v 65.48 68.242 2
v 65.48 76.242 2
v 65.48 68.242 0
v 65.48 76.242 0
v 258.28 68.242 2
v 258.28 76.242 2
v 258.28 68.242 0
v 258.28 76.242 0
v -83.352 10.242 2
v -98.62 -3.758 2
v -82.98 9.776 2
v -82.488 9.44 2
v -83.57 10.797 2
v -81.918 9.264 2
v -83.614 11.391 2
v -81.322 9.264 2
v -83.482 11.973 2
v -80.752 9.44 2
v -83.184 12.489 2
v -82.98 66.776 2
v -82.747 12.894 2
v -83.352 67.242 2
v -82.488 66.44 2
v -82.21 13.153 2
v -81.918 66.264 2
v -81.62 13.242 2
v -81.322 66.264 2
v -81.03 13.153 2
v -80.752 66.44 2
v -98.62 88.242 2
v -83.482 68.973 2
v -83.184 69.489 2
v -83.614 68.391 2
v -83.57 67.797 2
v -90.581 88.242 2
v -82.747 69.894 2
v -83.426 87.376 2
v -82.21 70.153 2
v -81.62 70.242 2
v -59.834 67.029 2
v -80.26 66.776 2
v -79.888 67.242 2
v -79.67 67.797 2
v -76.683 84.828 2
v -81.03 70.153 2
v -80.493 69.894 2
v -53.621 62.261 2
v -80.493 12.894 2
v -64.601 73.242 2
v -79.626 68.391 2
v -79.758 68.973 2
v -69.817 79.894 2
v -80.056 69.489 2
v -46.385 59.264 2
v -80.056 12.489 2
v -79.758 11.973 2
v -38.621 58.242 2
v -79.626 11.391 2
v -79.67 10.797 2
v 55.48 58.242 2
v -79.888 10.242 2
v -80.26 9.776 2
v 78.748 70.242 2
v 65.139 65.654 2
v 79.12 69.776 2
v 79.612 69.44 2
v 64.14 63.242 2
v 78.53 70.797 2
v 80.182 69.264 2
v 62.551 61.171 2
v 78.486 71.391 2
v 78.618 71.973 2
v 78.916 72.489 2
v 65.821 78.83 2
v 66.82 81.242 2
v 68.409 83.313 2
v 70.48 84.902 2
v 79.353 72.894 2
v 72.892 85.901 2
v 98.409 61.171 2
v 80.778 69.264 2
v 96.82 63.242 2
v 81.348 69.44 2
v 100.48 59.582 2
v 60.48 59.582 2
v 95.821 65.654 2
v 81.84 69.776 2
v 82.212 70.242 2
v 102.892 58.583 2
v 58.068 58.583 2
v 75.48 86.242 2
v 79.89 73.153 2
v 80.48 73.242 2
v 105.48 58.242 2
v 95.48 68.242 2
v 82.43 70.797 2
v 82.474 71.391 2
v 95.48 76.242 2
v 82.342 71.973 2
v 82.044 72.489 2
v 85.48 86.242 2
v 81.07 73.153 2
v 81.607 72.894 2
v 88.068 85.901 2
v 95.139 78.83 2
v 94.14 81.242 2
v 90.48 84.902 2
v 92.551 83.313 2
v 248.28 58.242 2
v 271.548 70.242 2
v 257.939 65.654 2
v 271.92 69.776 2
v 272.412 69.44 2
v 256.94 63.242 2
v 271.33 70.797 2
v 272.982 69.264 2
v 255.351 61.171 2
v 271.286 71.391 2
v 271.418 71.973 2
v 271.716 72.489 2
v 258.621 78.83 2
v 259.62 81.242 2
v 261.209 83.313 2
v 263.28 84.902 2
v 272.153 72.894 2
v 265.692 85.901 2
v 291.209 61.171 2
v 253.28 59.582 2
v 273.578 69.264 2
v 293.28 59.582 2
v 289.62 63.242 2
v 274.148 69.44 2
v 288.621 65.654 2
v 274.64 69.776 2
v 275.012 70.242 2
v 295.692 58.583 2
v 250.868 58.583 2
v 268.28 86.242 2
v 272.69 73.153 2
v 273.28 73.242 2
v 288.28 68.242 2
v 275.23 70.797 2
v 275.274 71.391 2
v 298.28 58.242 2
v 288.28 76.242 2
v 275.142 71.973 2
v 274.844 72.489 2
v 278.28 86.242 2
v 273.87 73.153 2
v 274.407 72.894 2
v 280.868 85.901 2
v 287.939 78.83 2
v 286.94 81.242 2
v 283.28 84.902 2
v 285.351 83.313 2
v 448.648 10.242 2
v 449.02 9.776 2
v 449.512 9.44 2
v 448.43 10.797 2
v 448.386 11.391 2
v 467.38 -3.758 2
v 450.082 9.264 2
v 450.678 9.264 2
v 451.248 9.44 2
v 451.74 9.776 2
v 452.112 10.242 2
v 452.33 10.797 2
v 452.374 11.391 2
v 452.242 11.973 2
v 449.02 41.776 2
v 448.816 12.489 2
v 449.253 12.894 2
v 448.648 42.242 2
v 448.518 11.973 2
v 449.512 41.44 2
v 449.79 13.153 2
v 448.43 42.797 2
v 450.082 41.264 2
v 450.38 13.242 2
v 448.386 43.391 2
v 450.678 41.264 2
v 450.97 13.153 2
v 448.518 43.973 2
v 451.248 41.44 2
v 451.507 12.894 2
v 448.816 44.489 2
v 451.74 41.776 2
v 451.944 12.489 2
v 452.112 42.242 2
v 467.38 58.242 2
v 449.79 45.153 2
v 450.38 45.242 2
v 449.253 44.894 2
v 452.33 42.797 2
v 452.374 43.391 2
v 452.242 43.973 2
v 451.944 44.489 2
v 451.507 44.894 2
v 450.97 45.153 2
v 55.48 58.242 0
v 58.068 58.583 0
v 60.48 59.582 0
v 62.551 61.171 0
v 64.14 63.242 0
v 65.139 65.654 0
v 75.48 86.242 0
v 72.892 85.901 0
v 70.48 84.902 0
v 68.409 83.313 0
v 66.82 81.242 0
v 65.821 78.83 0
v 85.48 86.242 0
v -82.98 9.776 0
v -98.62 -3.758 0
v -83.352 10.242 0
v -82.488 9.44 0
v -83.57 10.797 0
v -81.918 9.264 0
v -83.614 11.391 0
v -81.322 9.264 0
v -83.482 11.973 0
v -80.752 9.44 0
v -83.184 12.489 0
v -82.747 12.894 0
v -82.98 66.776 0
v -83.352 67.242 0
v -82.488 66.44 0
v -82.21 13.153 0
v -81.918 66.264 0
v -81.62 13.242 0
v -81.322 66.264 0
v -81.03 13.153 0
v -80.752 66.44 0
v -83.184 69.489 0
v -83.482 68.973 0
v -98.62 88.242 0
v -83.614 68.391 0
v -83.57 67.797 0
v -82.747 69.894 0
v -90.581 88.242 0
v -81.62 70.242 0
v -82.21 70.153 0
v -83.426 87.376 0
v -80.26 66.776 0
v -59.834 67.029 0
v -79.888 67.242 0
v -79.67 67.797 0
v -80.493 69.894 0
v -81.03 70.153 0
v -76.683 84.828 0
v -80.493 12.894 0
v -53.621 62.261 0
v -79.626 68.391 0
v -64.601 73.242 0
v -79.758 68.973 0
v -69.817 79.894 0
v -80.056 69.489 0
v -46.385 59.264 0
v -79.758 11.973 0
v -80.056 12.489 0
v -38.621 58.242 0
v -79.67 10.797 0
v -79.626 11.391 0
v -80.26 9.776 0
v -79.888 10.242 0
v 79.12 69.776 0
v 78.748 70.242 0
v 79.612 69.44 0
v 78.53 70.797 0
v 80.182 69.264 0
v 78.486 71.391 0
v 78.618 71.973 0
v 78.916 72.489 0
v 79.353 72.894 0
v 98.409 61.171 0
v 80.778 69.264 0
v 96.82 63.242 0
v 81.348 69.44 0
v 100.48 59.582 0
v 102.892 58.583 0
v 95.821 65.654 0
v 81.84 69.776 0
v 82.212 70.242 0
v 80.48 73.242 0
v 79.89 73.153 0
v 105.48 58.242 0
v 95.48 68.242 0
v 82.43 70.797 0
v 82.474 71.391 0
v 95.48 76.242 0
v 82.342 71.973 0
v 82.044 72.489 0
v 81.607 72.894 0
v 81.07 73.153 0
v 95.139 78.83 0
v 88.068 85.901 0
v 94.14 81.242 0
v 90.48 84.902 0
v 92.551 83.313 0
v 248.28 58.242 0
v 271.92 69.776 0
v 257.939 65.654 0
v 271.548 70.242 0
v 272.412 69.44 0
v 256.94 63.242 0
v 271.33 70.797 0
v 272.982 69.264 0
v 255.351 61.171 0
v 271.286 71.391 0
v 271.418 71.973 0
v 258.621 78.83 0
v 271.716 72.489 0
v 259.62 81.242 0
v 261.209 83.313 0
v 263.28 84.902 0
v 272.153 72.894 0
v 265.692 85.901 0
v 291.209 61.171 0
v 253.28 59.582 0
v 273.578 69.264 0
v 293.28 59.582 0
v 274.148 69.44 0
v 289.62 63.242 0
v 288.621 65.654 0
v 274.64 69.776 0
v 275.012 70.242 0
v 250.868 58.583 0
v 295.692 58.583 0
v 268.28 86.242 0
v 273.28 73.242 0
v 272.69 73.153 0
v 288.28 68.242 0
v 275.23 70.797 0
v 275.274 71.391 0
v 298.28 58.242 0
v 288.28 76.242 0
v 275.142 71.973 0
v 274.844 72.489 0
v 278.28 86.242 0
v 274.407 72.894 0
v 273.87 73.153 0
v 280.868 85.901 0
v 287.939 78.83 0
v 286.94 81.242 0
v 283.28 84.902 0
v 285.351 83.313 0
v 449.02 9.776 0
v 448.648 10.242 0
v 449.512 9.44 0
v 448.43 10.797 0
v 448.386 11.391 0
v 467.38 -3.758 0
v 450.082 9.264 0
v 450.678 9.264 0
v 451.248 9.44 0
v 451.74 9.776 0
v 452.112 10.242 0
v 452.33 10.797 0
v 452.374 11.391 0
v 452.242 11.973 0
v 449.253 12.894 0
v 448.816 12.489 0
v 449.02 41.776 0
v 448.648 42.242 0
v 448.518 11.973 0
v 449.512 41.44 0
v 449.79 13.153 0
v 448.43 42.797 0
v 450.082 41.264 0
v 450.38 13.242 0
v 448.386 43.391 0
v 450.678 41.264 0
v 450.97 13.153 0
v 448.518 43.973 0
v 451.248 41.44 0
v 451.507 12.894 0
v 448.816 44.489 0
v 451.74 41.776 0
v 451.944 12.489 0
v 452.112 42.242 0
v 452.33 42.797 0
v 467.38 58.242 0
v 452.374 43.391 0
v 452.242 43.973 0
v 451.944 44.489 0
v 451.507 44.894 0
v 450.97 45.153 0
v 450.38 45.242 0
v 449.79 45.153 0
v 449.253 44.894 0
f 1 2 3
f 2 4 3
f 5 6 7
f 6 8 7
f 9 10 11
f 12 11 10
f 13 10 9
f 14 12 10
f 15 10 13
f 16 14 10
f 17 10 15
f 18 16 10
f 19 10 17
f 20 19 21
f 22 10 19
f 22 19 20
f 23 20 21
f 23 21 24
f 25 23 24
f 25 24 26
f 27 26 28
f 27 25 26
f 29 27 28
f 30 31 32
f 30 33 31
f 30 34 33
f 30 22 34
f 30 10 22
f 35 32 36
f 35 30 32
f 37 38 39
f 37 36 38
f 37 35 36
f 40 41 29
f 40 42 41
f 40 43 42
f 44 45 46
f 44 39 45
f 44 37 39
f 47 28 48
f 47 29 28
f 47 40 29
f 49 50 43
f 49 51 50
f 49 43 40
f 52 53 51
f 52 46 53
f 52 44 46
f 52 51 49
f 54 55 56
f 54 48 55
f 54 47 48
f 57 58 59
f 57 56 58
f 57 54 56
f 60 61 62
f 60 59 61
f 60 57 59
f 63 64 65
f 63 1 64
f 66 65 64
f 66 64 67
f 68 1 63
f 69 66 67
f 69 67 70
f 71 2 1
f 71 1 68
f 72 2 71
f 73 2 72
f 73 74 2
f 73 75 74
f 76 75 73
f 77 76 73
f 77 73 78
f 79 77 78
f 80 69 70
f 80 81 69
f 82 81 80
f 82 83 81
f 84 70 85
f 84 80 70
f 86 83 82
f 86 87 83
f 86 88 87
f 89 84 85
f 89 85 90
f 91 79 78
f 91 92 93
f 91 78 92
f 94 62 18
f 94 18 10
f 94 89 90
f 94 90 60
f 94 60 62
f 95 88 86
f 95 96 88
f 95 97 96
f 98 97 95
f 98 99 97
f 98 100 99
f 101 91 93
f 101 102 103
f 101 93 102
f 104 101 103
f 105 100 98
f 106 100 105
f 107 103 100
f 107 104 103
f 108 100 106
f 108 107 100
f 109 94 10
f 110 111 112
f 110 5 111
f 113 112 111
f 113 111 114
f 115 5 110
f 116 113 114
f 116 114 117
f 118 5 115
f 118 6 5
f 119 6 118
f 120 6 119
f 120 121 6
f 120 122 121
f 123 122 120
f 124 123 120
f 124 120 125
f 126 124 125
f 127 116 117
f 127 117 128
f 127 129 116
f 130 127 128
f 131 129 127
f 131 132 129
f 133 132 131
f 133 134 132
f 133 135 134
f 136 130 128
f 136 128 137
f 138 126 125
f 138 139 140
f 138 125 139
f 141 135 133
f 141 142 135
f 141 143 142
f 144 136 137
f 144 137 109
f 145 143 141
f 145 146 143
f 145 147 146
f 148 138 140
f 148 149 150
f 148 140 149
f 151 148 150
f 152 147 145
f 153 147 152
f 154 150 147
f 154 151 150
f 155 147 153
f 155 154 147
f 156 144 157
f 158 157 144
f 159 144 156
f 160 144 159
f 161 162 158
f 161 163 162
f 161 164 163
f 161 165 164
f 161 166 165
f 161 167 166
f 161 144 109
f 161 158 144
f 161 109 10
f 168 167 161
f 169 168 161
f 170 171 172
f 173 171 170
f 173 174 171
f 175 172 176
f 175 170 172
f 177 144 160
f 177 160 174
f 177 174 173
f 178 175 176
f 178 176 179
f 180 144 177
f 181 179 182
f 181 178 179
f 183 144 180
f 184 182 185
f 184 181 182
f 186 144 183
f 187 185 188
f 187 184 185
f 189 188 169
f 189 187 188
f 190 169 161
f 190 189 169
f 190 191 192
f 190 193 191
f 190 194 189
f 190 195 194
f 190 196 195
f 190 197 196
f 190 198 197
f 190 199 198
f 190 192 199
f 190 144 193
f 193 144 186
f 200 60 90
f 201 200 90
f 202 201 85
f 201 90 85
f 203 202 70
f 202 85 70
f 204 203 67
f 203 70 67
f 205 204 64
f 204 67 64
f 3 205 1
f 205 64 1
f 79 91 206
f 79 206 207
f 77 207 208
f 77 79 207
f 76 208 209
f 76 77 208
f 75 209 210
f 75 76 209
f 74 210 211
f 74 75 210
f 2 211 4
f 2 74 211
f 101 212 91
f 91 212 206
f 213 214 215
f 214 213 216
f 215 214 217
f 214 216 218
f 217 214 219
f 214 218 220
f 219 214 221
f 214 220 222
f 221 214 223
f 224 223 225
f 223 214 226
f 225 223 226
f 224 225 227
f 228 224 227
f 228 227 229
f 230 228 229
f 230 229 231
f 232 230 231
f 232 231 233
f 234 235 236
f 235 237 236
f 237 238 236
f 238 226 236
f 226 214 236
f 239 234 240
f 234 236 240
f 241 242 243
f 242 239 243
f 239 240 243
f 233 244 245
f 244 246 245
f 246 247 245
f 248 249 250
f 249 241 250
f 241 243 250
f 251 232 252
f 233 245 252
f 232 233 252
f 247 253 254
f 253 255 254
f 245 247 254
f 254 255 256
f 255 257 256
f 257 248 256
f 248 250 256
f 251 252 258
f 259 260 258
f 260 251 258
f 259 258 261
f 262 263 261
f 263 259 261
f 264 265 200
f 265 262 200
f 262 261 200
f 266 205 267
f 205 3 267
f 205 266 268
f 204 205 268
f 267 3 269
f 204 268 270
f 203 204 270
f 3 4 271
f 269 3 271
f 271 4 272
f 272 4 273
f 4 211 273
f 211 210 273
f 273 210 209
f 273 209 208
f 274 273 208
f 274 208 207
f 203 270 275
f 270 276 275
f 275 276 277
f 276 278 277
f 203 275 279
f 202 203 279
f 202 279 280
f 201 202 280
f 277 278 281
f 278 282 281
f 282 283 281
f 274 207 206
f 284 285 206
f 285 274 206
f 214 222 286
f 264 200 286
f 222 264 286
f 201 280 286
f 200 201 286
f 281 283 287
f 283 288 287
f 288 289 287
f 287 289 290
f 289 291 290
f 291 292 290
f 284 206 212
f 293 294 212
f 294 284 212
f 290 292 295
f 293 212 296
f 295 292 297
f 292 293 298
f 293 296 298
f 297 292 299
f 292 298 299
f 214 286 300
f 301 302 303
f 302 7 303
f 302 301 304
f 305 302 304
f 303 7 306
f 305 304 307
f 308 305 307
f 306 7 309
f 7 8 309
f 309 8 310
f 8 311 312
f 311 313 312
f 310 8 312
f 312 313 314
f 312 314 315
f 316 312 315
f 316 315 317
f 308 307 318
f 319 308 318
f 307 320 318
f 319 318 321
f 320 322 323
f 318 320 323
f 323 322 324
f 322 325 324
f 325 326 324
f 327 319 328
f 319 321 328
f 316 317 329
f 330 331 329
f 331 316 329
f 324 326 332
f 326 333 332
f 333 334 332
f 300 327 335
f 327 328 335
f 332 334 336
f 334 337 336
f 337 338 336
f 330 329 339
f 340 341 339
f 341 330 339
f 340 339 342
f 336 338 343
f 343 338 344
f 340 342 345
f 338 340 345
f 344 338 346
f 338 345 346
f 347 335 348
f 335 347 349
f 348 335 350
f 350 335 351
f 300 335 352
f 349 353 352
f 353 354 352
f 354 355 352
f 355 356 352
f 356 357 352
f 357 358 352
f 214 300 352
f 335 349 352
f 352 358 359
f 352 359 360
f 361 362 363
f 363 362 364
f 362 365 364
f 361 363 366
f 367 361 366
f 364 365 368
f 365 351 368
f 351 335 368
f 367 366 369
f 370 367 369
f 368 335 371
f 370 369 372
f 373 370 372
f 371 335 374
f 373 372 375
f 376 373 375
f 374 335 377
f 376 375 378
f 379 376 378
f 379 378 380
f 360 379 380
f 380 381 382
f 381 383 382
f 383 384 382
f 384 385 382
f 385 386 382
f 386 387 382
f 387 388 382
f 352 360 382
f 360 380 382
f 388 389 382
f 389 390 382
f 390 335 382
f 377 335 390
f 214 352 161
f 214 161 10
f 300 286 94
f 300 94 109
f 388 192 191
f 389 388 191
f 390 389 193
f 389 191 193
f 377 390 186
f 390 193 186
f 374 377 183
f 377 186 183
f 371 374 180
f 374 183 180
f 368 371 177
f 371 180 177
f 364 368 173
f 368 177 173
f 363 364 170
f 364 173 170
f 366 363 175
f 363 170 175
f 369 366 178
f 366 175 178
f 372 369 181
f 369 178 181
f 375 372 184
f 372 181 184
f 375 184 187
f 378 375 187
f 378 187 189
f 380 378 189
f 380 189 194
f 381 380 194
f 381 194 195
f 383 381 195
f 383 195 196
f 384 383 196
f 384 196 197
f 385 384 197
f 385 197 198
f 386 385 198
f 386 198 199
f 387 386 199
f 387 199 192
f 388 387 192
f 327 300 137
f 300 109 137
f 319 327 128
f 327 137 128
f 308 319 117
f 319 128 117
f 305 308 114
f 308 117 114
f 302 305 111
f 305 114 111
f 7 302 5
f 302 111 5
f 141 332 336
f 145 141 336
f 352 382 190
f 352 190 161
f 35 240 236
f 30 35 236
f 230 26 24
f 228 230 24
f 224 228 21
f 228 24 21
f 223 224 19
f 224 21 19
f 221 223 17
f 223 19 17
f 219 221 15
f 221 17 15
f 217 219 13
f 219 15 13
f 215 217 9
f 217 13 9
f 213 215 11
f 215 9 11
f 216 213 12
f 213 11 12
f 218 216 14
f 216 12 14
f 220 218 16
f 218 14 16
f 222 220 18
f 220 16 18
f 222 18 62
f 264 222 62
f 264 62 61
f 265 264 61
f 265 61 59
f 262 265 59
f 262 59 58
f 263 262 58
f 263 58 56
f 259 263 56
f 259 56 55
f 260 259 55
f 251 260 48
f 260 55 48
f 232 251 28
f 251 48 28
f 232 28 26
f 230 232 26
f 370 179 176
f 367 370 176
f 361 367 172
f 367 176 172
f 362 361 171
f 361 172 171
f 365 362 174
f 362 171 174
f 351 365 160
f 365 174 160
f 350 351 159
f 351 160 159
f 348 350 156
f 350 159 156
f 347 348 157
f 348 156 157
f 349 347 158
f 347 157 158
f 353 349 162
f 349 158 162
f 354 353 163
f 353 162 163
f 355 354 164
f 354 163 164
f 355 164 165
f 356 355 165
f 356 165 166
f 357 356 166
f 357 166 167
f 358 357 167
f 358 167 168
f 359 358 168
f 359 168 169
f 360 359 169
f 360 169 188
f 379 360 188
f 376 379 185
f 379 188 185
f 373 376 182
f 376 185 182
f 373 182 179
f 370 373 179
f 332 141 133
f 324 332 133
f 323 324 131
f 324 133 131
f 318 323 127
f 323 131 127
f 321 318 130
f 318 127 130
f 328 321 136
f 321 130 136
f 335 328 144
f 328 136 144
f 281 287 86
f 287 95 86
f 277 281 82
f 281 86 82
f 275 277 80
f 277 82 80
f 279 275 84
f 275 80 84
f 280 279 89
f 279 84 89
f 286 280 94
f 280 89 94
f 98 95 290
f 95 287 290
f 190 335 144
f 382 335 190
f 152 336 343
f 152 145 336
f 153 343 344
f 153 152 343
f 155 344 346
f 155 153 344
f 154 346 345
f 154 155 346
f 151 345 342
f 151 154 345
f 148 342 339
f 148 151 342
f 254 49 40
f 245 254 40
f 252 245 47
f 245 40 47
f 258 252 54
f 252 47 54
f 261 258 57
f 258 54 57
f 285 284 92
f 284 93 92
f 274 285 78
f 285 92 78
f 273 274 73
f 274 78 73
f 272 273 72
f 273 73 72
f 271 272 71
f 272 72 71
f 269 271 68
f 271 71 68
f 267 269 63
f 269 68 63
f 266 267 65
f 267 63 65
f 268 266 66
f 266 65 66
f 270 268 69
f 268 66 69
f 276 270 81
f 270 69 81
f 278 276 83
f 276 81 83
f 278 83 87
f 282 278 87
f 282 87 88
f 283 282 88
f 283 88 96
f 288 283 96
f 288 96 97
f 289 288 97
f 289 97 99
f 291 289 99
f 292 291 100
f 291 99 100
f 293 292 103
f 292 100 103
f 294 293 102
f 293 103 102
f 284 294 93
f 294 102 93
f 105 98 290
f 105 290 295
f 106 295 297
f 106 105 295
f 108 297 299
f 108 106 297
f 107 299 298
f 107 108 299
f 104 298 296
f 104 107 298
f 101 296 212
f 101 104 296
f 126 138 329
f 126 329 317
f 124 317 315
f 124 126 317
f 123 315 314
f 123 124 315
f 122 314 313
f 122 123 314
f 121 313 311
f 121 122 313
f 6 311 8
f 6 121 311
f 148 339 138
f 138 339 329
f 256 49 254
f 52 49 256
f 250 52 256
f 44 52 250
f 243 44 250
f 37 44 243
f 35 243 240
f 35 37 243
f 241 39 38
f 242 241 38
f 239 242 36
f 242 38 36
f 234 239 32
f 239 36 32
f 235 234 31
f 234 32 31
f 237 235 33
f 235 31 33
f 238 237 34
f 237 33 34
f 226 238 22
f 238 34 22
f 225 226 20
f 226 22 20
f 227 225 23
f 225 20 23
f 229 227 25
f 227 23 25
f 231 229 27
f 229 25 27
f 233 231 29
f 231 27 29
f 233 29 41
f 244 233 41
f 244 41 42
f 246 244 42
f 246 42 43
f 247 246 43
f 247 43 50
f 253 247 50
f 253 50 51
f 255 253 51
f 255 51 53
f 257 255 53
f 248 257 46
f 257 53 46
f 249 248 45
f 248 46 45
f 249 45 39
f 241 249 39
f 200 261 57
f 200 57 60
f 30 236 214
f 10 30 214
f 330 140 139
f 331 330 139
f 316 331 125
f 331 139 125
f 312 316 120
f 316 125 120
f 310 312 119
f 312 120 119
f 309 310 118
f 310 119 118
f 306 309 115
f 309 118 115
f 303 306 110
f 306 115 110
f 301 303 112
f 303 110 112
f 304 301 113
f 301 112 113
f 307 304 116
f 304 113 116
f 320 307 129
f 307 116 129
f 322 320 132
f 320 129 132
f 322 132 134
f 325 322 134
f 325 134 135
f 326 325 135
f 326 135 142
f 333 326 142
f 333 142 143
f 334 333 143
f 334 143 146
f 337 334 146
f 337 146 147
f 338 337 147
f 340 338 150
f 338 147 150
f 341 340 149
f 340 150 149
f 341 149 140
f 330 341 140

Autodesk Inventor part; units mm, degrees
ref_plane "YZ Plane" through (0, 0, 0) normal (1, 0, 0) x (0, 1, 0)
ref_plane "XZ Plane" through (0, 0, 0) normal (0, 1, 0) x (-1, 0, 0)
ref_plane "XY Plane" through (0, 0, 0) normal (0, 0, 1) x (1, 0, 0)
sketch "Szkic1" plane through (0, 0, 0) normal (0, 0, 1) x (1, 0, 0)
  line L0 (-98.62, 58.242) -> (467.38, 58.242)
  line L1 (467.38, 58.242) -> (467.38, -3.758)
  line L2 (467.38, -3.758) -> (-98.62, -3.758)
  line L3 (-98.62, -3.758) -> (-98.62, 58.242)
  line L4 (65.48, 58.242) -> (95.48, 58.242)
  line L5 (95.48, 58.242) -> (95.48, 86.242)
  line L6 (95.48, 86.242) -> (65.48, 86.242)
  line L7 (65.48, 86.242) -> (65.48, 58.242)
  line L8 (258.28, 58.242) -> (288.28, 58.242)
  line L9 (288.28, 58.242) -> (288.28, 86.242)
  line L10 (288.28, 86.242) -> (258.28, 86.242)
  line L11 (258.28, 86.242) -> (258.28, 58.242)
  line L12 (-98.62, 58.242) -> (-68.62, 58.242)
  line L13 (-68.62, 58.242) -> (-68.62, 88.242)
  line L14 (-68.62, 88.242) -> (-98.62, 88.242)
  line L15 (-98.62, 88.242) -> (-98.62, 58.242)
  point P0 (0, 0)
  point P1 (80.48, 71.242)
  point P2 (273.28, 71.242)
  point P3 (-81.62, 68.242)
  point P4 (450.38, 43.242)
  point P5 (-81.62, 11.242)
  point P6 (450.38, 11.242)
  dimension "d0" = 566
  dimension "d1" = 62
  dimension "d2" = 30
  dimension "d3" = 28
  dimension "d4" = 30
  dimension "d5" = 28
  dimension "d6" = 164.1
  dimension "d7" = 356.9
  dimension "d11" = 15
  dimension "d12" = 15
  dimension "d13" = 15
  dimension "d14" = 15
  dimension "d16" = 15
  dimension "d17" = 17
  dimension "d18" = 17
  dimension "d26" = 17
  dimension "d27" = 15
  dimension "d28" = 17
  dimension "d29" = 15
  dimension "d30" = 30
  dimension "d31" = 30
  dimension "d33" = 20
extrude "Wyciągnięcie proste1" add sketch "Szkic1" along normal blind 2
fillet "Zaokrąglenie1" radius 10 8 edges at (258.28, 58.242, 1) (258.28, 86.242, 1) (288.28, 86.242, 1) (288.28, 58.242, 1) (95.48, 58.242, 1) (95.48, 86.242, 1) (65.48, 86.242, 1) (65.48, 58.242, 1)
hole "Otwór1" at (80.48, 71.242, 0) at (273.28, 71.242, 0) at (-81.62, 68.242, 0) at (450.38, 43.242, 0) at (-81.62, 11.242, 0) at (450.38, 11.242, 0) direction (0, 0, 1) diameter 4 end through all
fillet "Zaokrąglenie2" radius 30 2 edges at (-68.62, 58.242, 1) (-68.62, 88.242, 1)
equation "\"d3\" = d5"
equation "\"d12\" = d11"
equation "\"d13\" = 0.5 * d2"
equation "\"d14\" = 0.5 * d4"
equation "\"d16\" = d15"
equation "\"d27\" = d15"
equation "\"d29\" = d16"
equation "\"d15\" = 15"
properties part number "LC_ALU_2mm_Right_Plate"
